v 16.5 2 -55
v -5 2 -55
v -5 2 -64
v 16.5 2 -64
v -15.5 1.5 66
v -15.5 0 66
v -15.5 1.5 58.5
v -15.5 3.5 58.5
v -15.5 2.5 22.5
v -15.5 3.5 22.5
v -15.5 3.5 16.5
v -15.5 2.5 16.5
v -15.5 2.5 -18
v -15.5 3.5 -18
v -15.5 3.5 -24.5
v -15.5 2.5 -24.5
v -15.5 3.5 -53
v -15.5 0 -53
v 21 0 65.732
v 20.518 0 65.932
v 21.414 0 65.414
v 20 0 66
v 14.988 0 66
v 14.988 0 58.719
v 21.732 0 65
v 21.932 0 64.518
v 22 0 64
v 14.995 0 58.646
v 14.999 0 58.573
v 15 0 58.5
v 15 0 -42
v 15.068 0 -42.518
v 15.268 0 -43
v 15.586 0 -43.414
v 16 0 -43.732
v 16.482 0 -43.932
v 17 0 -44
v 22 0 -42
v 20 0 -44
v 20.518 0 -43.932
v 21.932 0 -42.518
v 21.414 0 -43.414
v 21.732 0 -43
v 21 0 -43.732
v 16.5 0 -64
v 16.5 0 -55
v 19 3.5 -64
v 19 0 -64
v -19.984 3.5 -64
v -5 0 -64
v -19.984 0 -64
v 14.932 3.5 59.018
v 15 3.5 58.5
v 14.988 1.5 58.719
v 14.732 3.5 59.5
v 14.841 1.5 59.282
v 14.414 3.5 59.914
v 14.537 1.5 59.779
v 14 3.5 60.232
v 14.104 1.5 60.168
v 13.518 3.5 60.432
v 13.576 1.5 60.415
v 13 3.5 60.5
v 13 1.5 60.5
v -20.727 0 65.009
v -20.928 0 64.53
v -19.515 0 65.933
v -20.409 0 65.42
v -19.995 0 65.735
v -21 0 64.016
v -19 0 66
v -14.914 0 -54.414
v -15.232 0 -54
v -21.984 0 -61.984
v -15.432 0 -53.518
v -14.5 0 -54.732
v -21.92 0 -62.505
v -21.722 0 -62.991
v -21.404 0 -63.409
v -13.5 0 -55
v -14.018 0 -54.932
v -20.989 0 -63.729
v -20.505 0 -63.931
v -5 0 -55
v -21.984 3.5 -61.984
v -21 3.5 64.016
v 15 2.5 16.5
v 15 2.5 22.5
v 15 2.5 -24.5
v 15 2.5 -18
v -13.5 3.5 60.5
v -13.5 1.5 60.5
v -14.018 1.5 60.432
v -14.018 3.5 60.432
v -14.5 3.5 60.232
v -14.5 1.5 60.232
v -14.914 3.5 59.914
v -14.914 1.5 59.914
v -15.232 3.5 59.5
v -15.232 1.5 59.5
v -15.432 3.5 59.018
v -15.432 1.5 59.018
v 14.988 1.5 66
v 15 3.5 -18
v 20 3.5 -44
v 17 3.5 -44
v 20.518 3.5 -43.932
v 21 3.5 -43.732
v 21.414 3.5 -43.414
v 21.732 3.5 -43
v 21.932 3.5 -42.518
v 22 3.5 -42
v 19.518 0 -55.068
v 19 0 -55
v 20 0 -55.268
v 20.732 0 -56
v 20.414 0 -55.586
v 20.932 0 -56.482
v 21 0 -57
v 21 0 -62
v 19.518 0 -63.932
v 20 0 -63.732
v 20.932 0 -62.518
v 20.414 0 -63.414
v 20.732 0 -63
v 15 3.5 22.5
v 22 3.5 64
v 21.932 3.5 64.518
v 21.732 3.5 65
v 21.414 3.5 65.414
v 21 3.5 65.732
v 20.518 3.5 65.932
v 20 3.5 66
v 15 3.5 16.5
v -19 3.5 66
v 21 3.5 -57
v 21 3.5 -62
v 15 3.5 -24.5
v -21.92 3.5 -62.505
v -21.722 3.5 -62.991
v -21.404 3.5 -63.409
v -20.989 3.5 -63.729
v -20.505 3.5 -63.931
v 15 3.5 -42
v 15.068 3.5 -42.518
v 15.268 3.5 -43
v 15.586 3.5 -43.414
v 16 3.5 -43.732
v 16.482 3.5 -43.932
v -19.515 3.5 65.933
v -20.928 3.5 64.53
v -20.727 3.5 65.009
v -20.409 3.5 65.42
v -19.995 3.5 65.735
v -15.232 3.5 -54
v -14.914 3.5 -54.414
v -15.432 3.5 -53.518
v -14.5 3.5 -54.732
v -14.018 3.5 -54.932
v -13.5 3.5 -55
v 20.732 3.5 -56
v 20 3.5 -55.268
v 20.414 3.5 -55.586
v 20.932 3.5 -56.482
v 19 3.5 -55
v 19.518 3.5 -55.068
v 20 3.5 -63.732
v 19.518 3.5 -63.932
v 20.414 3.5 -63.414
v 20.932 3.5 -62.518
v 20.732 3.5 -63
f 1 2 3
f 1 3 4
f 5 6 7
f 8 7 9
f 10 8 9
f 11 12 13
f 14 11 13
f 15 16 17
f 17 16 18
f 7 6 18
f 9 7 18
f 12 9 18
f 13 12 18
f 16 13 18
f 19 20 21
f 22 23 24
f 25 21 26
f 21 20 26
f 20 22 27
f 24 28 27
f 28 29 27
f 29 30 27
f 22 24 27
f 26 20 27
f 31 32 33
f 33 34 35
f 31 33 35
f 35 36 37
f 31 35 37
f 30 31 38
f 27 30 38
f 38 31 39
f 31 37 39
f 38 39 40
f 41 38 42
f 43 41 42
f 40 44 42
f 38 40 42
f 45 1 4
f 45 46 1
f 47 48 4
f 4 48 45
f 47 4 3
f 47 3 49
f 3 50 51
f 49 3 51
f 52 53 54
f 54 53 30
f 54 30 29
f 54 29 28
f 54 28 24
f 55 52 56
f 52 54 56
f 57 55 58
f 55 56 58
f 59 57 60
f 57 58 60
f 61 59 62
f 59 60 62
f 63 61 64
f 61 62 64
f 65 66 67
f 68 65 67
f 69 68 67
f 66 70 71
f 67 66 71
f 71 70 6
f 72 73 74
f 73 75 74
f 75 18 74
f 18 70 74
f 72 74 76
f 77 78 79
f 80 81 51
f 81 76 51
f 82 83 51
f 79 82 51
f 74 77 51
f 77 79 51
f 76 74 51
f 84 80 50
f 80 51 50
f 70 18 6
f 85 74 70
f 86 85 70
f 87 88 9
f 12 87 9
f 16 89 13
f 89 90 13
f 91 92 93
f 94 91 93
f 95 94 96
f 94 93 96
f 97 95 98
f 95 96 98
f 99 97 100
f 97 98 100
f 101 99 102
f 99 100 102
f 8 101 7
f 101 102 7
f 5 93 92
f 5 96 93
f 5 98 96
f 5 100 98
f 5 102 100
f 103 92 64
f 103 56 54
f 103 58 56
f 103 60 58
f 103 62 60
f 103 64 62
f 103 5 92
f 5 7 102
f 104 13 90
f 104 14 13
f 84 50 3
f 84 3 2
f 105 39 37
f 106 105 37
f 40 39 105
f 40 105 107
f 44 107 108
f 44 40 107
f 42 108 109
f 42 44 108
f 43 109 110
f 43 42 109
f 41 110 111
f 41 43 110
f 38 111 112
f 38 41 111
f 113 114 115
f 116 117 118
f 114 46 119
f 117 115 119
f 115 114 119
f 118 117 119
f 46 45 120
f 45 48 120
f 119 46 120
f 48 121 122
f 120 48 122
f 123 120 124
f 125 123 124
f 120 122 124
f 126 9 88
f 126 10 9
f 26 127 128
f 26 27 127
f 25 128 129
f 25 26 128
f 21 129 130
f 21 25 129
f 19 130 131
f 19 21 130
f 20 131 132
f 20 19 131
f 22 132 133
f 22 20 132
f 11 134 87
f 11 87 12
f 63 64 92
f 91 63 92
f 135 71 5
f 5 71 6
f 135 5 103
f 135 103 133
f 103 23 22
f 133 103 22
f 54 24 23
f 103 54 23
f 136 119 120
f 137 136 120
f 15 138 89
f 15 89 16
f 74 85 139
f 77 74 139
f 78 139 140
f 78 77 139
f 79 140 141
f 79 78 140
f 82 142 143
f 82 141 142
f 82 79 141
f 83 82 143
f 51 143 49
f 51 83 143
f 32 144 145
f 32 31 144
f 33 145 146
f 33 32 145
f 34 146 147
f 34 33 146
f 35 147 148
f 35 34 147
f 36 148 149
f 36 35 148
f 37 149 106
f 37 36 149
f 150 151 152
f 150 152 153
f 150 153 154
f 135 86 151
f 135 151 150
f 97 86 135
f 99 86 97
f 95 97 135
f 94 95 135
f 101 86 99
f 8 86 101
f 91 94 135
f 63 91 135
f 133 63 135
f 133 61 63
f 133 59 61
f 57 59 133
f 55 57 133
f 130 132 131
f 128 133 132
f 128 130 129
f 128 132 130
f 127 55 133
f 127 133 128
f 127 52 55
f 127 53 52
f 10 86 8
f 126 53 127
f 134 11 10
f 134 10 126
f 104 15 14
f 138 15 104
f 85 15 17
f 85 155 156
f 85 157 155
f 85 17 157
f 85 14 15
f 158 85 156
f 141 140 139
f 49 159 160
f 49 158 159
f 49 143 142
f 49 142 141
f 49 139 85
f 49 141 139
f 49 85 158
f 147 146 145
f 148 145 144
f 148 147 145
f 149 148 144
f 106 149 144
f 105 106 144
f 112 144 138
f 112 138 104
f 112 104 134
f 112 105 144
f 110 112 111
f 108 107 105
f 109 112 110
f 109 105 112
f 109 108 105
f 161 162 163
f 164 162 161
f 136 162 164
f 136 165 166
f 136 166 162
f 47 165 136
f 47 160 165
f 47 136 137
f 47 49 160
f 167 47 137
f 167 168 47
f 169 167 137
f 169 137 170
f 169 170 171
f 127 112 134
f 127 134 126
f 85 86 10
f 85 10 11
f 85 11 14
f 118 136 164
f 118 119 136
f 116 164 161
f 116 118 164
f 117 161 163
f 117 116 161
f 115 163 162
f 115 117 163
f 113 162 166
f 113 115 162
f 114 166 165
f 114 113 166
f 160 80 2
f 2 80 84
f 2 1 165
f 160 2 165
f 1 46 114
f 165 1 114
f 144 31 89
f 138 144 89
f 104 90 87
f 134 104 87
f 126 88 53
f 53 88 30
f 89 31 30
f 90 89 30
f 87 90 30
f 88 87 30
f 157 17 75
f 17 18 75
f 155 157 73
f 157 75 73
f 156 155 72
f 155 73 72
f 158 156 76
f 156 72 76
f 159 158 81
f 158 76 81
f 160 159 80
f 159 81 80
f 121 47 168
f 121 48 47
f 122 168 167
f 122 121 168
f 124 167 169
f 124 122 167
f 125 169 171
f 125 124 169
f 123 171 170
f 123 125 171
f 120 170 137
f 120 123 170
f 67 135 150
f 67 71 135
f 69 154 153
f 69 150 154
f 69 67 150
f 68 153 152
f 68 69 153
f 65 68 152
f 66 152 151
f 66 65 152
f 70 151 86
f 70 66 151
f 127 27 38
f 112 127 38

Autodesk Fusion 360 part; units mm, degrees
sketch "Sketch1" plane through (0, 0, 0) normal (0, 1, 0) x (1, 0, 0)
  line L0 (15, 42) -> (15, -58.5)
  line L1 (13, -60.5) -> (-13.5, -60.5)
  line L2 (-15.5, -58.5) -> (-15.5, 53)
  line L3 (-13.5, 55) -> (19, 55)
  line L4 (21, 57) -> (21, 62)
  line L5 (19, 64) -> (-19.9844, 64)
  line L6 (-21.9844, 61.9844) -> (-20.9999, -64.0156)
  line L7 (-19, -66) -> (20, -66)
  line L8 (22, -64) -> (22, 42)
  line L9 (20, 44) -> (17, 44)
  arc A0 (22, 42) -> (20, 44) centre (20, 42) ccw
  arc A1 (17, 44) -> (15, 42) centre (17, 42) ccw
  arc A2 (20, -66) -> (22, -64) centre (20, -64) ccw
  arc A3 (13, -60.5) -> (15, -58.5) centre (13, -58.5) ccw
  arc A4 (-20.9999, -64.0156) -> (-19, -66) centre (-19, -64) ccw
  arc A5 (-15.5, -58.5) -> (-13.5, -60.5) centre (-13.5, -58.5) ccw
  arc A6 (-13.5, 55) -> (-15.5, 53) centre (-13.5, 53) ccw
  arc A7 (19, 55) -> (21, 57) centre (19, 57) ccw
  arc A8 (21, 62) -> (19, 64) centre (19, 62) ccw
  arc A9 (-19.9844, 64) -> (-21.9844, 61.9844) centre (-19.9844, 62) ccw
  dimension "d1" = 2
extrude "Extrude1" add sketch "Sketch1" along normal blind 3.5
sketch "Sketch2" plane through (0, 3.5, 0) normal (0, 1, 0) x (-1, 0, 0)
  line L0 (13.5, -55) -> (-19, -55)
  arc A0 (-19, -55) -> (-21, -57) centre (-19, -57) ccw
  line L1 (-21, -57) -> (-21, -62)
  arc A1 (-21, -62) -> (-19, -64) centre (-19, -62) ccw
  line L2 (-19, -64) -> (19.9844, -64)
  arc A2 (19.9844, -64) -> (21.9844, -61.9844) centre (19.9844, -62) ccw
  line L3 (21.9844, -61.9844) -> (20.9999, 64.0156)
  arc A3 (20.9999, 64.0156) -> (19, 66) centre (19, 64) ccw
  line L4 (19, 66) -> (-20, 66)
  arc A4 (-20, 66) -> (-22, 64) centre (-20, 64) ccw
  line L5 (-22, 64) -> (-22, -42)
  arc A5 (-22, -42) -> (-20, -44) centre (-20, -42) ccw
  line L6 (-20, -44) -> (-17, -44)
  arc A6 (-17, -44) -> (-15, -42) centre (-17, -42) ccw
  line L7 (-15, -42) -> (-15, 58.5)
  arc A7 (-13, 60.5) -> (-15, 58.5) centre (-13, 58.5) ccw
  line L8 (-13, 60.5) -> (13.5, 60.5)
  arc A8 (15.5, 58.5) -> (13.5, 60.5) centre (13.5, 58.5) ccw
  line L9 (15.5, 58.5) -> (15.5, -53)
  arc A9 (13.5, -55) -> (15.5, -53) centre (13.5, -53) ccw
  line L10 (-14.988, 67.5) -> (15.5, 67.5)
  line L11 (15.5, 67.5) -> (15.5, 58.5)
  line L12 (15.5, 58.5) -> (-14.988, 58.5)
  line L13 (-14.988, 58.5) -> (-14.988, 67.5)
sketch "Sketch3" plane through (0, 0, 0) normal (0, -1, 0) x (1, 0, 0)
  line L0 (19, -55) -> (-13.5, -55)
  arc A0 (-15.5, -53) -> (-13.5, -55) centre (-13.5, -53) ccw
  line L1 (-15.5, -53) -> (-15.5, 58.5)
  arc A1 (-13.5, 60.5) -> (-15.5, 58.5) centre (-13.5, 58.5) ccw
  line L2 (-13.5, 60.5) -> (13, 60.5)
  arc A2 (15, 58.5) -> (13, 60.5) centre (13, 58.5) ccw
  line L3 (15, 58.5) -> (15, -42)
  arc A3 (15, -42) -> (17, -44) centre (17, -42) ccw
  line L4 (17, -44) -> (20, -44)
  arc A4 (20, -44) -> (22, -42) centre (20, -42) ccw
  line L5 (22, -42) -> (22, 64)
  arc A5 (22, 64) -> (20, 66) centre (20, 64) ccw
  line L6 (20, 66) -> (-19, 66)
  arc A6 (-19, 66) -> (-20.9999, 64.0156) centre (-19, 64) ccw
  line L7 (-20.9999, 64.0156) -> (-21.9844, -61.9844)
  arc A7 (-21.9844, -61.9844) -> (-19.9844, -64) centre (-19.9844, -62) ccw
  line L8 (-19.9844, -64) -> (19, -64)
  arc A8 (19, -64) -> (21, -62) centre (19, -62) ccw
  line L9 (21, -62) -> (21, -57)
  arc A9 (21, -57) -> (19, -55) centre (19, -57) ccw
  line L10 (-15.5, 51.9243) -> (14.988, 51.9243)
  line L11 (14.988, 51.9243) -> (14.988, 76)
  line L12 (14.988, 76) -> (-15.5, 76)
  line L13 (-15.5, 76) -> (-15.5, 51.9243)
extrude "Extrude3" cut sketch "Sketch3" against normal blind 1.5 contours A1 L2 A2 L6 L11 L13
sketch "Sketch4" plane through (0, 3.5, 0) normal (0, 1, 0) x (-1, 0, 0)
  line L0 (13.5, -55) -> (-19, -55)
  arc A0 (-19, -55) -> (-21, -57) centre (-19, -57) ccw
  line L1 (-21, -57) -> (-21, -62)
  arc A1 (-21, -62) -> (-19, -64) centre (-19, -62) ccw
  line L2 (-19, -64) -> (19.9844, -64)
  arc A2 (19.9844, -64) -> (21.9844, -61.9844) centre (19.9844, -62) ccw
  line L3 (21.9844, -61.9844) -> (20.9999, 64.0156)
  arc A3 (20.9999, 64.0156) -> (19, 66) centre (19, 64) ccw
  line L4 (19, 66) -> (-20, 66)
  arc A4 (-20, 66) -> (-22, 64) centre (-20, 64) ccw
  line L5 (-22, 64) -> (-22, -42)
  arc A5 (-22, -42) -> (-20, -44) centre (-20, -42) ccw
  line L6 (-20, -44) -> (-17, -44)
  arc A6 (-17, -44) -> (-15, -42) centre (-17, -42) ccw
  line L7 (-15, -42) -> (-15, 58.5)
  arc A7 (-13, 60.5) -> (-15, 58.5) centre (-13, 58.5) ccw
  line L8 (-13, 60.5) -> (13.5, 60.5)
  arc A8 (15.5, 58.5) -> (13.5, 60.5) centre (13.5, 58.5) ccw
  line L9 (15.5, 58.5) -> (15.5, -53)
  arc A9 (13.5, -55) -> (15.5, -53) centre (13.5, -53) ccw
  line L10 (-15, -24.5) -> (17.4682, -24.5)
  line L11 (17.4682, -24.5) -> (17.4682, -18)
  line L12 (17.4682, -18) -> (-15, -18)
  line L13 (-15, -18) -> (-15, -24.5)
  line L14 (-15, 16.5) -> (17, 16.5)
  line L15 (17, 16.5) -> (17, 22.5)
  line L16 (17, 22.5) -> (-15, 22.5)
  line L17 (-15, 22.5) -> (-15, 16.5)
  line L18 (-13, 60.5) -> (13.5, 60.5)
  line L19 (-16.3717, -55) -> (5.5, -55)
  line L20 (5.5, -55) -> (5.5, -64)
  line L21 (5.5, -64) -> (-16.3717, -64)
  line L22 (-16.3717, -64) -> (-16.3717, -55)
  dimension "d10" = 6.5
  dimension "d11" = 6
  dimension "d12" = 38
  dimension "d13" = 78.5
extrude "Extrude4" add sketch "Sketch4" against normal blind 1 contours L7 L9 L10 L12 L13 | L7 L9 L14 L16 L17
sketch "Sketch5" plane through (0, 0, 0) normal (0, -1, 0) x (1, 0, 0)
  line L0 (-15.5, -53) -> (-15.5, 66)
  line L1 (-15.5, 66) -> (-19, 66)
  arc A0 (-19, 66) -> (-20.9999, 64.0156) centre (-19, 64) ccw
  line L2 (-20.9999, 64.0156) -> (-21.9844, -61.9844)
  arc A1 (-21.9844, -61.9844) -> (-19.9844, -64) centre (-19.9844, -62) ccw
  line L3 (-19.9844, -64) -> (19, -64)
  arc A2 (19, -64) -> (21, -62) centre (19, -62) ccw
  line L4 (21, -62) -> (21, -57)
  arc A3 (21, -57) -> (19, -55) centre (19, -57) ccw
  line L5 (19, -55) -> (-13.5, -55)
  arc A4 (-15.5, -53) -> (-13.5, -55) centre (-13.5, -53) ccw
  line L6 (16.5, -64) -> (-5, -64)
  line L7 (-5, -64) -> (-5, -55)
  line L8 (-5, -55) -> (16.5, -55)
  line L9 (16.5, -55) -> (16.5, -64)
extrude "Extrude5" cut sketch "Sketch5" against normal blind 2 contours L3 L5 L6 L7 L8 L9
